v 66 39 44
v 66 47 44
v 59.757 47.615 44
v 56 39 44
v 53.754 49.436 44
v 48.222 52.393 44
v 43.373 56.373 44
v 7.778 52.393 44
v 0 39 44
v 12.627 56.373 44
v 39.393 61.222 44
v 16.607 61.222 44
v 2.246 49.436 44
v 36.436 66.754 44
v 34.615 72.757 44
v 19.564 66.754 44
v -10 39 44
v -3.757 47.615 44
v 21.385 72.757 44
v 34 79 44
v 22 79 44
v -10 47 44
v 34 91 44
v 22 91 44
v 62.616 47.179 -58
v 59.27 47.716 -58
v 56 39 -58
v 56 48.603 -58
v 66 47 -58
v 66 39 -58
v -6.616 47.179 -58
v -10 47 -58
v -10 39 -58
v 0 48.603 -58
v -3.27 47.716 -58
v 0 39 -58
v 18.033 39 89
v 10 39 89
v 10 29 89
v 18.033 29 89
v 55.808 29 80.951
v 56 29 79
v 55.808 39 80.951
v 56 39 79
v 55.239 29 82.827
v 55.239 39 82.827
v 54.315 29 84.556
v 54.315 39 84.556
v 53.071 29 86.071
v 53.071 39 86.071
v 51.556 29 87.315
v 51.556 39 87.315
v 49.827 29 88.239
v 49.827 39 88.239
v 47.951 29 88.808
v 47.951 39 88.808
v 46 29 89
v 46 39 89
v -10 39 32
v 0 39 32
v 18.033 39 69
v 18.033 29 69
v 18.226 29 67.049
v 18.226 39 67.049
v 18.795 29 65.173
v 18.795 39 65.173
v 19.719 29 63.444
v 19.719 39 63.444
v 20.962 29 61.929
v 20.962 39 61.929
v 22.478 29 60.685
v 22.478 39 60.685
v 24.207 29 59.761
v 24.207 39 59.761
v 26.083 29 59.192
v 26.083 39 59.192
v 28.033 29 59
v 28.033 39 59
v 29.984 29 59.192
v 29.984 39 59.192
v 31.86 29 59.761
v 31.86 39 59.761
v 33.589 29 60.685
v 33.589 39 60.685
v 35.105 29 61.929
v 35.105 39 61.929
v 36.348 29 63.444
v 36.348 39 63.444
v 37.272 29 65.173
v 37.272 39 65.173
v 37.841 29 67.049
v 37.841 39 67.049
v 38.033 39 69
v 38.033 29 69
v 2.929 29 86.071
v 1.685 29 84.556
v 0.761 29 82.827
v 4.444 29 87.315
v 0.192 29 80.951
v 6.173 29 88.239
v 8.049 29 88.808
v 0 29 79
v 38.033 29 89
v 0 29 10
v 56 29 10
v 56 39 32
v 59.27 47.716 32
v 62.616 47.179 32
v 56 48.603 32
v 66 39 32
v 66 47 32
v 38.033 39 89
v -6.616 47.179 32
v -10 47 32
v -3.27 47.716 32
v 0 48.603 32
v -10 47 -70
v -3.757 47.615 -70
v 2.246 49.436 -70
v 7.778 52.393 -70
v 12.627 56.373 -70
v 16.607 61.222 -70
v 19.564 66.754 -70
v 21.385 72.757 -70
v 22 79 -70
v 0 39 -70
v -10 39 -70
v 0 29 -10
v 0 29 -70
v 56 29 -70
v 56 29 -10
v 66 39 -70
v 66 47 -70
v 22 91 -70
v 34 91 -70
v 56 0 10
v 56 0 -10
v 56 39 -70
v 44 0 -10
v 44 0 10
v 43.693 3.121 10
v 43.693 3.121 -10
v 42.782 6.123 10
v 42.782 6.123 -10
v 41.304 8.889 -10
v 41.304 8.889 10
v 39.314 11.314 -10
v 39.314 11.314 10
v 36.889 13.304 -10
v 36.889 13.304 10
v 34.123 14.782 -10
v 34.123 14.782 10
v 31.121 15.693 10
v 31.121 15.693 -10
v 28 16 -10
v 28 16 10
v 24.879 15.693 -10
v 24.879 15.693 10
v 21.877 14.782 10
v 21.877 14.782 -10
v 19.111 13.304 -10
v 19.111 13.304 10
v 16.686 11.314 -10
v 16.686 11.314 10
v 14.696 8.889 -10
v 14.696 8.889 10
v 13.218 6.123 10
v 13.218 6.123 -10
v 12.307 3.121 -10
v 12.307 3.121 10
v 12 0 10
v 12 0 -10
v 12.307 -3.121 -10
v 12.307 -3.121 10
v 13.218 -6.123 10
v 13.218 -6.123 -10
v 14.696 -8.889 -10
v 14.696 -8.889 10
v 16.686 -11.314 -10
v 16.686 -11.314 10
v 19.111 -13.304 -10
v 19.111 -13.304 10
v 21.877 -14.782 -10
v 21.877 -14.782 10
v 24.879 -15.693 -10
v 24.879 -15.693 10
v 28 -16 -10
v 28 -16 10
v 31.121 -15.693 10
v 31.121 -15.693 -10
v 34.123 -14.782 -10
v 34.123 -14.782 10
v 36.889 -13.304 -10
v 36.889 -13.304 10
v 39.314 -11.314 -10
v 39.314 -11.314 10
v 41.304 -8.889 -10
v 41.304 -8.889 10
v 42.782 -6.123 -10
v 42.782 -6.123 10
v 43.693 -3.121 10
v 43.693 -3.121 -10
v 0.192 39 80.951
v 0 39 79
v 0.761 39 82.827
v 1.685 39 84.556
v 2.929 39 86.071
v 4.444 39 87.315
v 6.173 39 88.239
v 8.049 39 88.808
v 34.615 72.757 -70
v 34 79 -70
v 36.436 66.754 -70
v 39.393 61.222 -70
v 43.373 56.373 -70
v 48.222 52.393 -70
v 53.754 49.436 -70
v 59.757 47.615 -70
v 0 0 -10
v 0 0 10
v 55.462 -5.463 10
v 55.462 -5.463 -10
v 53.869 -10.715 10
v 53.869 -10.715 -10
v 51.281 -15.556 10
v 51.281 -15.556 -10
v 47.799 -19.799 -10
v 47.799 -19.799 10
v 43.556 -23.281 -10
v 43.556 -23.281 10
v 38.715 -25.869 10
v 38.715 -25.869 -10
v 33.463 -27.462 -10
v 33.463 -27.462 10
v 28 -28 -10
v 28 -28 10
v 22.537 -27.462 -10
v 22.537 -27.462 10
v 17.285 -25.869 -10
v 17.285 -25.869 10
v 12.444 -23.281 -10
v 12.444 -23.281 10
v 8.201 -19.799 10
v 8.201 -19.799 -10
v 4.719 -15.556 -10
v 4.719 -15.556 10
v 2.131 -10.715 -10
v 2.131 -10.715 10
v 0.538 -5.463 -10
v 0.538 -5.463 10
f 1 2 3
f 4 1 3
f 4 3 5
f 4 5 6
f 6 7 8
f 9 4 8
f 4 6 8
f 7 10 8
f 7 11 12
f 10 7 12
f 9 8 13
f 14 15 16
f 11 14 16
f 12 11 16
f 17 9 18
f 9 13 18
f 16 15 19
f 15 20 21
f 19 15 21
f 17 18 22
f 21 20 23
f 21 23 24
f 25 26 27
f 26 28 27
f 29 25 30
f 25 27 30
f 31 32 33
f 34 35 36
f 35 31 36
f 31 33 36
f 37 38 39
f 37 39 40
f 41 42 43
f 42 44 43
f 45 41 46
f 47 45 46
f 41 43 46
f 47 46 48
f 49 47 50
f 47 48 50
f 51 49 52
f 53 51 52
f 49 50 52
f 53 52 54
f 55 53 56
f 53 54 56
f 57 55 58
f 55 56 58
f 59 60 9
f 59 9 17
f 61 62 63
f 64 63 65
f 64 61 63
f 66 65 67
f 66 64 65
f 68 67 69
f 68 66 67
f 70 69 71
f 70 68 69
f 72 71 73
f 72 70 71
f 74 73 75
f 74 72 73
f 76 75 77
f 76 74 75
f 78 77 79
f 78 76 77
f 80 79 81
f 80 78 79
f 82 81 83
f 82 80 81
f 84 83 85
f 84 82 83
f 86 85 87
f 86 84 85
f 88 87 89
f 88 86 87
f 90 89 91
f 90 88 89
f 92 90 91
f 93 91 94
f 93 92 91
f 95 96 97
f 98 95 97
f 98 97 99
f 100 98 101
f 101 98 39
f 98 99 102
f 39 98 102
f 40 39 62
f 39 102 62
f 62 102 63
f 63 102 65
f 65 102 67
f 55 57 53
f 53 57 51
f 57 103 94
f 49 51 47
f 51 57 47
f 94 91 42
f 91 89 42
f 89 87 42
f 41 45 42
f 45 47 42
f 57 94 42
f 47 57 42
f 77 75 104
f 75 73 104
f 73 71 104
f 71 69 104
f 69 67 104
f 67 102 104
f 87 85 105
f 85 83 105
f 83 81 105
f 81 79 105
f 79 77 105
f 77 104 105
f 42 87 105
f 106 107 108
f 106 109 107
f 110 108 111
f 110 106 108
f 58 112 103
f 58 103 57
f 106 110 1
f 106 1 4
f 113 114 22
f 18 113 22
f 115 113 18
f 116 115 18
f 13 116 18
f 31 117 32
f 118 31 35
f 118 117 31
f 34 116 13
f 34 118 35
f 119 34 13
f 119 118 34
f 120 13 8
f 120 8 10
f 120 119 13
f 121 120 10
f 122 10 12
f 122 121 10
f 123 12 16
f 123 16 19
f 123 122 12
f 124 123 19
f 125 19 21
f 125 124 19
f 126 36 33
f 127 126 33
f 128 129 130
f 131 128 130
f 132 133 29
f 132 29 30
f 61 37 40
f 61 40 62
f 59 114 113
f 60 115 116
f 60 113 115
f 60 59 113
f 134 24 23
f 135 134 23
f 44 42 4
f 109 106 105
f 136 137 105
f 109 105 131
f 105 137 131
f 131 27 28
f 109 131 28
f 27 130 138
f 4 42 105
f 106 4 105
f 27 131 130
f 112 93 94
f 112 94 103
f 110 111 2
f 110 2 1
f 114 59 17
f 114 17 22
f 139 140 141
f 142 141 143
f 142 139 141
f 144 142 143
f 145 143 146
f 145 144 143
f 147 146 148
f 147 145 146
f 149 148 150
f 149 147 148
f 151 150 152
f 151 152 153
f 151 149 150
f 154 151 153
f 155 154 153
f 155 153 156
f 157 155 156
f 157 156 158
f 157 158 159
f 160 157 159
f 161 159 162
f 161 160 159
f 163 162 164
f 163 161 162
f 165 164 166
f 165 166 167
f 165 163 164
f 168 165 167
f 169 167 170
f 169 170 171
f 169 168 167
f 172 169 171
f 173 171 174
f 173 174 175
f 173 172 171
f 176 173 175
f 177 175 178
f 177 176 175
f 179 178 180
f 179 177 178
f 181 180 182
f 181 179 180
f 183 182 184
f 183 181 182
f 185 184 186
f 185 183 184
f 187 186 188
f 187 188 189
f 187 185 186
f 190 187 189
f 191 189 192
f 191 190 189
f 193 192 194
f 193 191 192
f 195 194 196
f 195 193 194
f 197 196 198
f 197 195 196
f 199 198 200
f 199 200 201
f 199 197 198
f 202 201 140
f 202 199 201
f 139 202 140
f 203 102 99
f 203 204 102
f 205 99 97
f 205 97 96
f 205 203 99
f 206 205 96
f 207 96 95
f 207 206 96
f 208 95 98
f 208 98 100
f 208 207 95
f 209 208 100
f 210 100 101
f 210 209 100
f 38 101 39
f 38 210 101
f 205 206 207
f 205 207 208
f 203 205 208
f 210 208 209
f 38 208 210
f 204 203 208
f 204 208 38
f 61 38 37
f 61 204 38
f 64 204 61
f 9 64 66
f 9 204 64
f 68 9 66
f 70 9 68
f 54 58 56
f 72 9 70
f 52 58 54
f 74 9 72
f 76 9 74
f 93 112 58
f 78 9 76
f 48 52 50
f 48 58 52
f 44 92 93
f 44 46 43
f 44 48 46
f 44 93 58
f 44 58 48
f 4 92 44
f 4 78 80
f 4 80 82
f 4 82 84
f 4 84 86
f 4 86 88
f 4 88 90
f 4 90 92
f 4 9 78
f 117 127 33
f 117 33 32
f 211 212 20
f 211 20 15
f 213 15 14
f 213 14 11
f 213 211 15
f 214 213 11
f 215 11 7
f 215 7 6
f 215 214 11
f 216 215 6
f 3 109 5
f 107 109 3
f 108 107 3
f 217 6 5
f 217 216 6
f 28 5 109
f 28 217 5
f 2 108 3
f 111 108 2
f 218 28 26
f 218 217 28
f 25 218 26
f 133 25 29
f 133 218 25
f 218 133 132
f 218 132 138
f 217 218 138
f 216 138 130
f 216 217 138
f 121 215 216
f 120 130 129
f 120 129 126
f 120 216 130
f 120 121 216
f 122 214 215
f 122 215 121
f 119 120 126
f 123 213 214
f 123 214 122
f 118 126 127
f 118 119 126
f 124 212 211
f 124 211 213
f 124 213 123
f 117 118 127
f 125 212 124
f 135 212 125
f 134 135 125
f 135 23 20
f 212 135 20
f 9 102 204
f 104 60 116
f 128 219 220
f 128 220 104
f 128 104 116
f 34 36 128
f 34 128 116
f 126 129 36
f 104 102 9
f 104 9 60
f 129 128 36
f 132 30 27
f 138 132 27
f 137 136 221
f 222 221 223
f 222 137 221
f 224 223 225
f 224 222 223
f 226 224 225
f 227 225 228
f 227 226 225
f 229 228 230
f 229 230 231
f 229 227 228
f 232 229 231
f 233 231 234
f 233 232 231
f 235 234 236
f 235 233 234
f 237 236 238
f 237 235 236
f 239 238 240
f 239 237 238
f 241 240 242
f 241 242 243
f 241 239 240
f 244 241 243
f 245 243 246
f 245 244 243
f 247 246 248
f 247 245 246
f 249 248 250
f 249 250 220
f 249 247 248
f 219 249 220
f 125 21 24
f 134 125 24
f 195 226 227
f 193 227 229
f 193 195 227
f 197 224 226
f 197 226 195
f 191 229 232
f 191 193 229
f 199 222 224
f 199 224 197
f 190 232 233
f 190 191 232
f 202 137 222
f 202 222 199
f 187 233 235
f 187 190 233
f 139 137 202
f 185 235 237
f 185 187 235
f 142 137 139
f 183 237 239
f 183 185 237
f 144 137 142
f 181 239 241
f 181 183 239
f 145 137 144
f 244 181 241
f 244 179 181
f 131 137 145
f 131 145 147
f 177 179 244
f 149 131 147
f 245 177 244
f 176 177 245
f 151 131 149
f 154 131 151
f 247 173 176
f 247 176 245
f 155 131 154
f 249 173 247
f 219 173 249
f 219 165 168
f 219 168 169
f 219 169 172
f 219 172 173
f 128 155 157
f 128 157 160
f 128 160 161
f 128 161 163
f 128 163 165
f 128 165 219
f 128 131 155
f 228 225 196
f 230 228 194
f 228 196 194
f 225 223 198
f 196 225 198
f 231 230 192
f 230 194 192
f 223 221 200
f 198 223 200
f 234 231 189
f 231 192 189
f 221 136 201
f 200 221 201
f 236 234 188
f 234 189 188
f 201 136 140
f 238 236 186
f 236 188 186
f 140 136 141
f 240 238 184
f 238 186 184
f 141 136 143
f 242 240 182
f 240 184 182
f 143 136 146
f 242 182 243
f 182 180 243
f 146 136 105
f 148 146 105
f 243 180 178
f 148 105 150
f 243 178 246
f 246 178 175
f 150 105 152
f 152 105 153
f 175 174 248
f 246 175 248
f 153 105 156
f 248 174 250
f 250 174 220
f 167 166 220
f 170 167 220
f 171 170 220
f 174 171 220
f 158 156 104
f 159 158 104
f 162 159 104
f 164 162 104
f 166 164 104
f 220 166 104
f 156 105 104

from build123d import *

# Parameters (mm, degrees)
BOSS_EXTRUDE3_DEPTH      = 89
BOSS_EXTRUDE3_DEPTH_BACK = 70
SKETCH7_W                = 56
SKETCH7_H                = 10
BOSS_EXTRUDE4_DEPTH      = 44
BOSS_EXTRUDE4_DEPTH_BACK = 70
BOSS_EXTRUDE5_DEPTH      = 10
BOSS_EXTRUDE5_DEPTH_BACK = 10
SKETCH1_R                = 16
CUT_EXTRUDE1_REACH       = 131.484
FILLET1_R                = 10
CUT_EXTRUDE3_REACH       = 131.484
SKETCH10_W               = 10
SKETCH10_H               = 90


with BuildPart() as part:
    # Sketch7 → Boss-Extrude3 (new, two sides: drawn at the far end of the back side and taken through both)
    with BuildSketch(Plane.XY.offset(-BOSS_EXTRUDE3_DEPTH_BACK)):
        with Locations((28, 34)):
            Rectangle(SKETCH7_W, SKETCH7_H)
    extrude(amount=BOSS_EXTRUDE3_DEPTH + BOSS_EXTRUDE3_DEPTH_BACK)

    # Sketch5 → Boss-Extrude4 (add, two sides: drawn at the far end of the back side and taken through both)
    with BuildSketch(Plane.XY.offset(-BOSS_EXTRUDE4_DEPTH_BACK)):
        with BuildLine():
            Line((22, 79), (22, 91))
            Line((22, 91), (34, 91))
            Line((34, 91), (34, 79))
            ThreePointArc((34, 79), (43.372583002, 56.372583002), (66, 47))
            Line((66, 47), (66, 39))
            Line((66, 39), (-10, 39))
            Line((-10, 39), (-10, 47))
            ThreePointArc((-10, 47), (12.627416998, 56.372583002), (22, 79))
        make_face()
    extrude(amount=BOSS_EXTRUDE4_DEPTH + BOSS_EXTRUDE4_DEPTH_BACK)

    # Sketch1 → Boss-Extrude5 (add, two sides: drawn at the far end of the back side and taken through both)
    with BuildSketch(Plane.XY.offset(-BOSS_EXTRUDE5_DEPTH_BACK)):
        with BuildLine():
            Line((0, 0), (0, 29))
            Line((0, 29), (56, 29))
            Line((56, 29), (56, 0))
            ThreePointArc((56, 0), (28, -28), (0, 0))
        make_face()
        with Locations((28, 0)):
            Circle(SKETCH1_R, mode=Mode.SUBTRACT)
    extrude(amount=BOSS_EXTRUDE5_DEPTH + BOSS_EXTRUDE5_DEPTH_BACK)

    # Sketch9 → Cut-Extrude1 (cut, up to next)
    with BuildSketch(Plane(origin=(0, 39, 0), x_dir=(1, 0, 0), z_dir=(0, 1, 0)), mode=Mode.PRIVATE) as cut_extrude1_sk1:
        with BuildLine():
            Line((38.033469933, -69), (38.033469933, -89))
            Line((38.033469933, -89), (18.033469933, -89))
            Line((18.033469933, -89), (18.033469933, -69))
            ThreePointArc((18.033469933, -69), (28.033469933, -59), (38.033469933, -69))
        make_face()
    cut_extrude1_tool1 = extrude(cut_extrude1_sk1.sketch, amount=-CUT_EXTRUDE1_REACH, mode=Mode.PRIVATE) & part.part
    add(cut_extrude1_tool1.solids().sort_by_distance((28.03347, 39, 74.983585))[0], mode=Mode.SUBTRACT)

    # Fillet1
    fillet1_edges = [part.edges().sort_by_distance(p)[0] for p in [
        (56, 34, 89),
        (0, 34, 89),
    ]]
    fillet(fillet1_edges, radius=FILLET1_R)

    # Sketch10 → Cut-Extrude3 (cut, up to next)
    with BuildSketch(Plane.XZ.offset(-39), mode=Mode.PRIVATE) as cut_extrude3_sk1:
        with Locations((-5, -13)):
            Rectangle(SKETCH10_W, SKETCH10_H)
    cut_extrude3_tool1 = extrude(cut_extrude3_sk1.sketch, amount=-CUT_EXTRUDE3_REACH, mode=Mode.PRIVATE) & part.part
    # Sketch10 → Cut-Extrude3 (cut, up to next)
    with BuildSketch(Plane.XZ.offset(-39), mode=Mode.PRIVATE) as cut_extrude3_sk2:
        with Locations((61, -13)):
            Rectangle(SKETCH10_W, SKETCH10_H)
    cut_extrude3_tool2 = extrude(cut_extrude3_sk2.sketch, amount=-CUT_EXTRUDE3_REACH, mode=Mode.PRIVATE) & part.part
    add(cut_extrude3_tool1.solids().sort_by_distance((-5, 39, -13))[0], mode=Mode.SUBTRACT)
    add(cut_extrude3_tool2.solids().sort_by_distance((61, 39, -13))[0], mode=Mode.SUBTRACT)


solid = part.part
